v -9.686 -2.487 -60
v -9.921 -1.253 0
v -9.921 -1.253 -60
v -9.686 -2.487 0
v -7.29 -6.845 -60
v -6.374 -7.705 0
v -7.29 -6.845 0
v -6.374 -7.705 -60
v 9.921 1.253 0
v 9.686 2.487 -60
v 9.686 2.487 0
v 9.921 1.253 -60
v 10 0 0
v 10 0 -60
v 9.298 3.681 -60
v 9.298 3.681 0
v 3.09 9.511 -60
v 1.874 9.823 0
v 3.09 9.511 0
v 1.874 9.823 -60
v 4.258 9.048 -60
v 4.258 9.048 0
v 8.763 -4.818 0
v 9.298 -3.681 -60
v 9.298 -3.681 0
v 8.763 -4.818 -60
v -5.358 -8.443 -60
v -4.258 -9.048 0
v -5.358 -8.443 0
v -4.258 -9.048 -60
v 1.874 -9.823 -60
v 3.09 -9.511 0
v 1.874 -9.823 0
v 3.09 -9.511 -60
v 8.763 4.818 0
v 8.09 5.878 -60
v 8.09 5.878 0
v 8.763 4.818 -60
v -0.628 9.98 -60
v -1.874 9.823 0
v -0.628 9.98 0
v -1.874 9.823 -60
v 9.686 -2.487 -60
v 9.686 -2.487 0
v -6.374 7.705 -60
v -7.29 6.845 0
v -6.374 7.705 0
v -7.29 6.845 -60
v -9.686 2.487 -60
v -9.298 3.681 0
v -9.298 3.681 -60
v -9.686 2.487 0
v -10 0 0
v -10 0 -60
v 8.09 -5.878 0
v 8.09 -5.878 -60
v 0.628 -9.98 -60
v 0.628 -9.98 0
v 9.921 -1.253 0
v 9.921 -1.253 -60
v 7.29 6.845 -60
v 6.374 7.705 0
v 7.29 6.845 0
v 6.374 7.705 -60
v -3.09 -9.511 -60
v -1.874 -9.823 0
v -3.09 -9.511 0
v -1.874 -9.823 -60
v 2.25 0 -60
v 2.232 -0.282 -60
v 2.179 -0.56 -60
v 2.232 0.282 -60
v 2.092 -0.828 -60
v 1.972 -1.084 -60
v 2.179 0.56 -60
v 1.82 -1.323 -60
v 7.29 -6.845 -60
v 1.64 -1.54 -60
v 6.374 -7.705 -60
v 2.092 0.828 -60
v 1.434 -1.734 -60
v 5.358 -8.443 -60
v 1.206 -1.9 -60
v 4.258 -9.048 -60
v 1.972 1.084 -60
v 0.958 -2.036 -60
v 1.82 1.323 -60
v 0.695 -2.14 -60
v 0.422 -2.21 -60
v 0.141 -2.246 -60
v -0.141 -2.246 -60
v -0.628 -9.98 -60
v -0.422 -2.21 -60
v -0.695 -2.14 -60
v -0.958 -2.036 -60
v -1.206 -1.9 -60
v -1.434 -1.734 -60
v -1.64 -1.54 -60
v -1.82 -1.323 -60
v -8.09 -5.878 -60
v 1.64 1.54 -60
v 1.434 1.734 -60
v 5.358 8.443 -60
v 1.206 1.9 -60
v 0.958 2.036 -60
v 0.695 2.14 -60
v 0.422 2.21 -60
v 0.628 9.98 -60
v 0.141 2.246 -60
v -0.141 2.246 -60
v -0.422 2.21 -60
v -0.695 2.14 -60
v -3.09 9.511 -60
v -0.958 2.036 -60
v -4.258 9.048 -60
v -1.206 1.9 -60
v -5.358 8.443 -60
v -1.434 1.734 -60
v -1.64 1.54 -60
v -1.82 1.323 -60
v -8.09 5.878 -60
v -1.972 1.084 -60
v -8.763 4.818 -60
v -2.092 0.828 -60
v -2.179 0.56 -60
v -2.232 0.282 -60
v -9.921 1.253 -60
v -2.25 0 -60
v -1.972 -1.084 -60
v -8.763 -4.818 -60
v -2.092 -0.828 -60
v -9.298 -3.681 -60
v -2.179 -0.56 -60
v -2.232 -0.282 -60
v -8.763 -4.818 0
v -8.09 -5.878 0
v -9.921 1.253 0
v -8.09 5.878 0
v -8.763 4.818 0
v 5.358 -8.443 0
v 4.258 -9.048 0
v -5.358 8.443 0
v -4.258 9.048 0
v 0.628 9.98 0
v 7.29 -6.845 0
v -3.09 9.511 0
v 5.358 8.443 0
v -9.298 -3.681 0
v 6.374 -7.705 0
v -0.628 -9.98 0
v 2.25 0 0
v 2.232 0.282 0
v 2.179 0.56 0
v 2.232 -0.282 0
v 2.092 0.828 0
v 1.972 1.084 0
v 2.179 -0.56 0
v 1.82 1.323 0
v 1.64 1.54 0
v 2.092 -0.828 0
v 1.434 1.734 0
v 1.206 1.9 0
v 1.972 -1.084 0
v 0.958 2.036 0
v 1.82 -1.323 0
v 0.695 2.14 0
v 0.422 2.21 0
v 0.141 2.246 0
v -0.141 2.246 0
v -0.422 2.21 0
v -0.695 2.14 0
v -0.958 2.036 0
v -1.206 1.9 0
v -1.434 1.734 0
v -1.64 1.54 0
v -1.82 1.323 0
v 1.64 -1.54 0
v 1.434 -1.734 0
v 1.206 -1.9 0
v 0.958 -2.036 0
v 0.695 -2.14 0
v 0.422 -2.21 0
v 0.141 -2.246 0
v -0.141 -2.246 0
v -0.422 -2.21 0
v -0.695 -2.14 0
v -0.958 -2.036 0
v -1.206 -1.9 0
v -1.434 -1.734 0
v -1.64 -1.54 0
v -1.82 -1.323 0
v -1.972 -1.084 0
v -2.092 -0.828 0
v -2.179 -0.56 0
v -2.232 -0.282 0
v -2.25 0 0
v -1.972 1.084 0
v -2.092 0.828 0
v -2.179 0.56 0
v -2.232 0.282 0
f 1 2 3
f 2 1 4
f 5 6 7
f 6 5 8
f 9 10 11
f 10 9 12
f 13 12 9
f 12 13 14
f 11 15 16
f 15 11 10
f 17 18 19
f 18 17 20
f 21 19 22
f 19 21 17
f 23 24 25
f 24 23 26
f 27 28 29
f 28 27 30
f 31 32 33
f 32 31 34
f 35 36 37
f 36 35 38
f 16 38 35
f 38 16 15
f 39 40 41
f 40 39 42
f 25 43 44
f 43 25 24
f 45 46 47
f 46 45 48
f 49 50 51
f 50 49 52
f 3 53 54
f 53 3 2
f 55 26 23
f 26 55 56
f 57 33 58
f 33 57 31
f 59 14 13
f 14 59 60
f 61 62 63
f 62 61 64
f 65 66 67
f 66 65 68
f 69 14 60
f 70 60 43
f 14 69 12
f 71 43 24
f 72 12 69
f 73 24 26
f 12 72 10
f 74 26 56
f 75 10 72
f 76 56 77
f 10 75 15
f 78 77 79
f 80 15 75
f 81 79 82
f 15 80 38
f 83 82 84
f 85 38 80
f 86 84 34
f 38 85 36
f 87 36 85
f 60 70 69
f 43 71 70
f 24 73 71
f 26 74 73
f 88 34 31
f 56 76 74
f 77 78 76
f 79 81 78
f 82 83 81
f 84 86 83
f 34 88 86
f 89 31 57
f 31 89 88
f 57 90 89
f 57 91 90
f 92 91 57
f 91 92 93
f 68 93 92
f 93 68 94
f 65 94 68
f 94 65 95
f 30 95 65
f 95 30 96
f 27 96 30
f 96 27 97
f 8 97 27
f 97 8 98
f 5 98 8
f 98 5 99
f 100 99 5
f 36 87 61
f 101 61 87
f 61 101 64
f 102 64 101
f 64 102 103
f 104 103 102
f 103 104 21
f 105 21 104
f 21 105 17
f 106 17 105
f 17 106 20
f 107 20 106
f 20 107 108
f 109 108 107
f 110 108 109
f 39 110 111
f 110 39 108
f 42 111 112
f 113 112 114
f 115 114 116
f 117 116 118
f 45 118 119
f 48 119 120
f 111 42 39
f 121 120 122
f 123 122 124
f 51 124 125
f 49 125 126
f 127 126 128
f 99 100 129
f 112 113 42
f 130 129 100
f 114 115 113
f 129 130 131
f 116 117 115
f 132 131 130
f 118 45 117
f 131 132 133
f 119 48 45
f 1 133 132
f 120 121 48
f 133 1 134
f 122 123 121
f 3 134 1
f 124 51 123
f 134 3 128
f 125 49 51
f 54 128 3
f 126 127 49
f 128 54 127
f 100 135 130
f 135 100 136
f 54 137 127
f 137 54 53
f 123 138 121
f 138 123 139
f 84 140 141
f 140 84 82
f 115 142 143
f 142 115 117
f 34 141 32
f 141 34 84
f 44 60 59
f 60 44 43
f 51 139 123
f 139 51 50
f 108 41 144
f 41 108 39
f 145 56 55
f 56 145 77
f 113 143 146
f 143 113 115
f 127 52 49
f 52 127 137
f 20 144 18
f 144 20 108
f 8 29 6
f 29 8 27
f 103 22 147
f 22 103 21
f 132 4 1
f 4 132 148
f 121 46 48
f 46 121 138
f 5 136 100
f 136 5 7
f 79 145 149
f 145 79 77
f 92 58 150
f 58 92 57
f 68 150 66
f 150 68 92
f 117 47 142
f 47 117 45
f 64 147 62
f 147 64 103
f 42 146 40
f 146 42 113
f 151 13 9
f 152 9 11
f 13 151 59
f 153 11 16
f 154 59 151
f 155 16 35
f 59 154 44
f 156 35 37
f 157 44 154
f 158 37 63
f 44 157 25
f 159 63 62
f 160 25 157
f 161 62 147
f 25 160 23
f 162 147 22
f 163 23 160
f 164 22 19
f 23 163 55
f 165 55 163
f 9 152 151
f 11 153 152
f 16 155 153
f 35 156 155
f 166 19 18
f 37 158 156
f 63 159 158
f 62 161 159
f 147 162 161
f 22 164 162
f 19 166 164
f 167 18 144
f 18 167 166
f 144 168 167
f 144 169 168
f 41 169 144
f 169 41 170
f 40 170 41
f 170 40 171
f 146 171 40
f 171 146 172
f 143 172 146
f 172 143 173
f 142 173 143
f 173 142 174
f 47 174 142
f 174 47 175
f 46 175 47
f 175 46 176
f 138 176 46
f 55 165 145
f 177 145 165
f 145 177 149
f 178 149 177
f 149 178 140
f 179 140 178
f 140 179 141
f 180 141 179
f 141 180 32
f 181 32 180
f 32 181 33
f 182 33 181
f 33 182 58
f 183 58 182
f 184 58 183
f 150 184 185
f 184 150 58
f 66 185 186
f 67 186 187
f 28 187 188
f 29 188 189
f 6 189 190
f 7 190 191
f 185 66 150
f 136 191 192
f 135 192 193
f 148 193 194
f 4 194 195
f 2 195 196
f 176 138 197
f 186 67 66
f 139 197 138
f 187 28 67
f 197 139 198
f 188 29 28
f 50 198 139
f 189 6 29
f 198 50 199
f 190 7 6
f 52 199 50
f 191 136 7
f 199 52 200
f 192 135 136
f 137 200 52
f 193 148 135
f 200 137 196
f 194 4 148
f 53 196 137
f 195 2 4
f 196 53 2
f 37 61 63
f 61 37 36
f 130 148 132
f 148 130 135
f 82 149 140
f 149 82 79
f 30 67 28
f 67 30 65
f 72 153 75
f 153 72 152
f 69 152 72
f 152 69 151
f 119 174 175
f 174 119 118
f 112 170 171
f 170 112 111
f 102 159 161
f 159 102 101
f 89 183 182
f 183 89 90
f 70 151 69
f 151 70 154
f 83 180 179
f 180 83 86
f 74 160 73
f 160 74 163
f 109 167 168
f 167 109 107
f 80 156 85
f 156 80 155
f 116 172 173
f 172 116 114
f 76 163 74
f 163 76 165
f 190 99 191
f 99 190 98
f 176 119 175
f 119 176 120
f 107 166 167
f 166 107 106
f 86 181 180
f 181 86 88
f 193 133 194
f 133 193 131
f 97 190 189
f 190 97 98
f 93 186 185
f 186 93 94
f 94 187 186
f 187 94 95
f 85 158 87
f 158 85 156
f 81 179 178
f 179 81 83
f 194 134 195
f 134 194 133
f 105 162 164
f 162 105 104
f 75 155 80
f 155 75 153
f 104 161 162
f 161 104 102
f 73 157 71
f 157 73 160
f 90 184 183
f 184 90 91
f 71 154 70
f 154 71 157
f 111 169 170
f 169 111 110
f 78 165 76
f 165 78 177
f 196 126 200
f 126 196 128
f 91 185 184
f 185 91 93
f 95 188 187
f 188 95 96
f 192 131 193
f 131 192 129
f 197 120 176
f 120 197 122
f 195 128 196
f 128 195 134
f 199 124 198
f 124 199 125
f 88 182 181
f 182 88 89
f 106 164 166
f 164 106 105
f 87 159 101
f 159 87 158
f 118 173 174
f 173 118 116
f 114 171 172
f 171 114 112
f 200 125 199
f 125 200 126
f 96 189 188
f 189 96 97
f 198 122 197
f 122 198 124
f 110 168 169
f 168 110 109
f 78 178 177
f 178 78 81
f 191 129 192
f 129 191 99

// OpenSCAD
$fn = 50;


difference() {
	union() {
		translate(v = [0, 0, -60.0000000000]) {
			cylinder(h = 60, r = 10.0000000000);
		}
	}
	union() {
		#translate(v = [0, 0, -60]) {
			cylinder(h = 60, r = 2.2500000000);
		}
	}
}
